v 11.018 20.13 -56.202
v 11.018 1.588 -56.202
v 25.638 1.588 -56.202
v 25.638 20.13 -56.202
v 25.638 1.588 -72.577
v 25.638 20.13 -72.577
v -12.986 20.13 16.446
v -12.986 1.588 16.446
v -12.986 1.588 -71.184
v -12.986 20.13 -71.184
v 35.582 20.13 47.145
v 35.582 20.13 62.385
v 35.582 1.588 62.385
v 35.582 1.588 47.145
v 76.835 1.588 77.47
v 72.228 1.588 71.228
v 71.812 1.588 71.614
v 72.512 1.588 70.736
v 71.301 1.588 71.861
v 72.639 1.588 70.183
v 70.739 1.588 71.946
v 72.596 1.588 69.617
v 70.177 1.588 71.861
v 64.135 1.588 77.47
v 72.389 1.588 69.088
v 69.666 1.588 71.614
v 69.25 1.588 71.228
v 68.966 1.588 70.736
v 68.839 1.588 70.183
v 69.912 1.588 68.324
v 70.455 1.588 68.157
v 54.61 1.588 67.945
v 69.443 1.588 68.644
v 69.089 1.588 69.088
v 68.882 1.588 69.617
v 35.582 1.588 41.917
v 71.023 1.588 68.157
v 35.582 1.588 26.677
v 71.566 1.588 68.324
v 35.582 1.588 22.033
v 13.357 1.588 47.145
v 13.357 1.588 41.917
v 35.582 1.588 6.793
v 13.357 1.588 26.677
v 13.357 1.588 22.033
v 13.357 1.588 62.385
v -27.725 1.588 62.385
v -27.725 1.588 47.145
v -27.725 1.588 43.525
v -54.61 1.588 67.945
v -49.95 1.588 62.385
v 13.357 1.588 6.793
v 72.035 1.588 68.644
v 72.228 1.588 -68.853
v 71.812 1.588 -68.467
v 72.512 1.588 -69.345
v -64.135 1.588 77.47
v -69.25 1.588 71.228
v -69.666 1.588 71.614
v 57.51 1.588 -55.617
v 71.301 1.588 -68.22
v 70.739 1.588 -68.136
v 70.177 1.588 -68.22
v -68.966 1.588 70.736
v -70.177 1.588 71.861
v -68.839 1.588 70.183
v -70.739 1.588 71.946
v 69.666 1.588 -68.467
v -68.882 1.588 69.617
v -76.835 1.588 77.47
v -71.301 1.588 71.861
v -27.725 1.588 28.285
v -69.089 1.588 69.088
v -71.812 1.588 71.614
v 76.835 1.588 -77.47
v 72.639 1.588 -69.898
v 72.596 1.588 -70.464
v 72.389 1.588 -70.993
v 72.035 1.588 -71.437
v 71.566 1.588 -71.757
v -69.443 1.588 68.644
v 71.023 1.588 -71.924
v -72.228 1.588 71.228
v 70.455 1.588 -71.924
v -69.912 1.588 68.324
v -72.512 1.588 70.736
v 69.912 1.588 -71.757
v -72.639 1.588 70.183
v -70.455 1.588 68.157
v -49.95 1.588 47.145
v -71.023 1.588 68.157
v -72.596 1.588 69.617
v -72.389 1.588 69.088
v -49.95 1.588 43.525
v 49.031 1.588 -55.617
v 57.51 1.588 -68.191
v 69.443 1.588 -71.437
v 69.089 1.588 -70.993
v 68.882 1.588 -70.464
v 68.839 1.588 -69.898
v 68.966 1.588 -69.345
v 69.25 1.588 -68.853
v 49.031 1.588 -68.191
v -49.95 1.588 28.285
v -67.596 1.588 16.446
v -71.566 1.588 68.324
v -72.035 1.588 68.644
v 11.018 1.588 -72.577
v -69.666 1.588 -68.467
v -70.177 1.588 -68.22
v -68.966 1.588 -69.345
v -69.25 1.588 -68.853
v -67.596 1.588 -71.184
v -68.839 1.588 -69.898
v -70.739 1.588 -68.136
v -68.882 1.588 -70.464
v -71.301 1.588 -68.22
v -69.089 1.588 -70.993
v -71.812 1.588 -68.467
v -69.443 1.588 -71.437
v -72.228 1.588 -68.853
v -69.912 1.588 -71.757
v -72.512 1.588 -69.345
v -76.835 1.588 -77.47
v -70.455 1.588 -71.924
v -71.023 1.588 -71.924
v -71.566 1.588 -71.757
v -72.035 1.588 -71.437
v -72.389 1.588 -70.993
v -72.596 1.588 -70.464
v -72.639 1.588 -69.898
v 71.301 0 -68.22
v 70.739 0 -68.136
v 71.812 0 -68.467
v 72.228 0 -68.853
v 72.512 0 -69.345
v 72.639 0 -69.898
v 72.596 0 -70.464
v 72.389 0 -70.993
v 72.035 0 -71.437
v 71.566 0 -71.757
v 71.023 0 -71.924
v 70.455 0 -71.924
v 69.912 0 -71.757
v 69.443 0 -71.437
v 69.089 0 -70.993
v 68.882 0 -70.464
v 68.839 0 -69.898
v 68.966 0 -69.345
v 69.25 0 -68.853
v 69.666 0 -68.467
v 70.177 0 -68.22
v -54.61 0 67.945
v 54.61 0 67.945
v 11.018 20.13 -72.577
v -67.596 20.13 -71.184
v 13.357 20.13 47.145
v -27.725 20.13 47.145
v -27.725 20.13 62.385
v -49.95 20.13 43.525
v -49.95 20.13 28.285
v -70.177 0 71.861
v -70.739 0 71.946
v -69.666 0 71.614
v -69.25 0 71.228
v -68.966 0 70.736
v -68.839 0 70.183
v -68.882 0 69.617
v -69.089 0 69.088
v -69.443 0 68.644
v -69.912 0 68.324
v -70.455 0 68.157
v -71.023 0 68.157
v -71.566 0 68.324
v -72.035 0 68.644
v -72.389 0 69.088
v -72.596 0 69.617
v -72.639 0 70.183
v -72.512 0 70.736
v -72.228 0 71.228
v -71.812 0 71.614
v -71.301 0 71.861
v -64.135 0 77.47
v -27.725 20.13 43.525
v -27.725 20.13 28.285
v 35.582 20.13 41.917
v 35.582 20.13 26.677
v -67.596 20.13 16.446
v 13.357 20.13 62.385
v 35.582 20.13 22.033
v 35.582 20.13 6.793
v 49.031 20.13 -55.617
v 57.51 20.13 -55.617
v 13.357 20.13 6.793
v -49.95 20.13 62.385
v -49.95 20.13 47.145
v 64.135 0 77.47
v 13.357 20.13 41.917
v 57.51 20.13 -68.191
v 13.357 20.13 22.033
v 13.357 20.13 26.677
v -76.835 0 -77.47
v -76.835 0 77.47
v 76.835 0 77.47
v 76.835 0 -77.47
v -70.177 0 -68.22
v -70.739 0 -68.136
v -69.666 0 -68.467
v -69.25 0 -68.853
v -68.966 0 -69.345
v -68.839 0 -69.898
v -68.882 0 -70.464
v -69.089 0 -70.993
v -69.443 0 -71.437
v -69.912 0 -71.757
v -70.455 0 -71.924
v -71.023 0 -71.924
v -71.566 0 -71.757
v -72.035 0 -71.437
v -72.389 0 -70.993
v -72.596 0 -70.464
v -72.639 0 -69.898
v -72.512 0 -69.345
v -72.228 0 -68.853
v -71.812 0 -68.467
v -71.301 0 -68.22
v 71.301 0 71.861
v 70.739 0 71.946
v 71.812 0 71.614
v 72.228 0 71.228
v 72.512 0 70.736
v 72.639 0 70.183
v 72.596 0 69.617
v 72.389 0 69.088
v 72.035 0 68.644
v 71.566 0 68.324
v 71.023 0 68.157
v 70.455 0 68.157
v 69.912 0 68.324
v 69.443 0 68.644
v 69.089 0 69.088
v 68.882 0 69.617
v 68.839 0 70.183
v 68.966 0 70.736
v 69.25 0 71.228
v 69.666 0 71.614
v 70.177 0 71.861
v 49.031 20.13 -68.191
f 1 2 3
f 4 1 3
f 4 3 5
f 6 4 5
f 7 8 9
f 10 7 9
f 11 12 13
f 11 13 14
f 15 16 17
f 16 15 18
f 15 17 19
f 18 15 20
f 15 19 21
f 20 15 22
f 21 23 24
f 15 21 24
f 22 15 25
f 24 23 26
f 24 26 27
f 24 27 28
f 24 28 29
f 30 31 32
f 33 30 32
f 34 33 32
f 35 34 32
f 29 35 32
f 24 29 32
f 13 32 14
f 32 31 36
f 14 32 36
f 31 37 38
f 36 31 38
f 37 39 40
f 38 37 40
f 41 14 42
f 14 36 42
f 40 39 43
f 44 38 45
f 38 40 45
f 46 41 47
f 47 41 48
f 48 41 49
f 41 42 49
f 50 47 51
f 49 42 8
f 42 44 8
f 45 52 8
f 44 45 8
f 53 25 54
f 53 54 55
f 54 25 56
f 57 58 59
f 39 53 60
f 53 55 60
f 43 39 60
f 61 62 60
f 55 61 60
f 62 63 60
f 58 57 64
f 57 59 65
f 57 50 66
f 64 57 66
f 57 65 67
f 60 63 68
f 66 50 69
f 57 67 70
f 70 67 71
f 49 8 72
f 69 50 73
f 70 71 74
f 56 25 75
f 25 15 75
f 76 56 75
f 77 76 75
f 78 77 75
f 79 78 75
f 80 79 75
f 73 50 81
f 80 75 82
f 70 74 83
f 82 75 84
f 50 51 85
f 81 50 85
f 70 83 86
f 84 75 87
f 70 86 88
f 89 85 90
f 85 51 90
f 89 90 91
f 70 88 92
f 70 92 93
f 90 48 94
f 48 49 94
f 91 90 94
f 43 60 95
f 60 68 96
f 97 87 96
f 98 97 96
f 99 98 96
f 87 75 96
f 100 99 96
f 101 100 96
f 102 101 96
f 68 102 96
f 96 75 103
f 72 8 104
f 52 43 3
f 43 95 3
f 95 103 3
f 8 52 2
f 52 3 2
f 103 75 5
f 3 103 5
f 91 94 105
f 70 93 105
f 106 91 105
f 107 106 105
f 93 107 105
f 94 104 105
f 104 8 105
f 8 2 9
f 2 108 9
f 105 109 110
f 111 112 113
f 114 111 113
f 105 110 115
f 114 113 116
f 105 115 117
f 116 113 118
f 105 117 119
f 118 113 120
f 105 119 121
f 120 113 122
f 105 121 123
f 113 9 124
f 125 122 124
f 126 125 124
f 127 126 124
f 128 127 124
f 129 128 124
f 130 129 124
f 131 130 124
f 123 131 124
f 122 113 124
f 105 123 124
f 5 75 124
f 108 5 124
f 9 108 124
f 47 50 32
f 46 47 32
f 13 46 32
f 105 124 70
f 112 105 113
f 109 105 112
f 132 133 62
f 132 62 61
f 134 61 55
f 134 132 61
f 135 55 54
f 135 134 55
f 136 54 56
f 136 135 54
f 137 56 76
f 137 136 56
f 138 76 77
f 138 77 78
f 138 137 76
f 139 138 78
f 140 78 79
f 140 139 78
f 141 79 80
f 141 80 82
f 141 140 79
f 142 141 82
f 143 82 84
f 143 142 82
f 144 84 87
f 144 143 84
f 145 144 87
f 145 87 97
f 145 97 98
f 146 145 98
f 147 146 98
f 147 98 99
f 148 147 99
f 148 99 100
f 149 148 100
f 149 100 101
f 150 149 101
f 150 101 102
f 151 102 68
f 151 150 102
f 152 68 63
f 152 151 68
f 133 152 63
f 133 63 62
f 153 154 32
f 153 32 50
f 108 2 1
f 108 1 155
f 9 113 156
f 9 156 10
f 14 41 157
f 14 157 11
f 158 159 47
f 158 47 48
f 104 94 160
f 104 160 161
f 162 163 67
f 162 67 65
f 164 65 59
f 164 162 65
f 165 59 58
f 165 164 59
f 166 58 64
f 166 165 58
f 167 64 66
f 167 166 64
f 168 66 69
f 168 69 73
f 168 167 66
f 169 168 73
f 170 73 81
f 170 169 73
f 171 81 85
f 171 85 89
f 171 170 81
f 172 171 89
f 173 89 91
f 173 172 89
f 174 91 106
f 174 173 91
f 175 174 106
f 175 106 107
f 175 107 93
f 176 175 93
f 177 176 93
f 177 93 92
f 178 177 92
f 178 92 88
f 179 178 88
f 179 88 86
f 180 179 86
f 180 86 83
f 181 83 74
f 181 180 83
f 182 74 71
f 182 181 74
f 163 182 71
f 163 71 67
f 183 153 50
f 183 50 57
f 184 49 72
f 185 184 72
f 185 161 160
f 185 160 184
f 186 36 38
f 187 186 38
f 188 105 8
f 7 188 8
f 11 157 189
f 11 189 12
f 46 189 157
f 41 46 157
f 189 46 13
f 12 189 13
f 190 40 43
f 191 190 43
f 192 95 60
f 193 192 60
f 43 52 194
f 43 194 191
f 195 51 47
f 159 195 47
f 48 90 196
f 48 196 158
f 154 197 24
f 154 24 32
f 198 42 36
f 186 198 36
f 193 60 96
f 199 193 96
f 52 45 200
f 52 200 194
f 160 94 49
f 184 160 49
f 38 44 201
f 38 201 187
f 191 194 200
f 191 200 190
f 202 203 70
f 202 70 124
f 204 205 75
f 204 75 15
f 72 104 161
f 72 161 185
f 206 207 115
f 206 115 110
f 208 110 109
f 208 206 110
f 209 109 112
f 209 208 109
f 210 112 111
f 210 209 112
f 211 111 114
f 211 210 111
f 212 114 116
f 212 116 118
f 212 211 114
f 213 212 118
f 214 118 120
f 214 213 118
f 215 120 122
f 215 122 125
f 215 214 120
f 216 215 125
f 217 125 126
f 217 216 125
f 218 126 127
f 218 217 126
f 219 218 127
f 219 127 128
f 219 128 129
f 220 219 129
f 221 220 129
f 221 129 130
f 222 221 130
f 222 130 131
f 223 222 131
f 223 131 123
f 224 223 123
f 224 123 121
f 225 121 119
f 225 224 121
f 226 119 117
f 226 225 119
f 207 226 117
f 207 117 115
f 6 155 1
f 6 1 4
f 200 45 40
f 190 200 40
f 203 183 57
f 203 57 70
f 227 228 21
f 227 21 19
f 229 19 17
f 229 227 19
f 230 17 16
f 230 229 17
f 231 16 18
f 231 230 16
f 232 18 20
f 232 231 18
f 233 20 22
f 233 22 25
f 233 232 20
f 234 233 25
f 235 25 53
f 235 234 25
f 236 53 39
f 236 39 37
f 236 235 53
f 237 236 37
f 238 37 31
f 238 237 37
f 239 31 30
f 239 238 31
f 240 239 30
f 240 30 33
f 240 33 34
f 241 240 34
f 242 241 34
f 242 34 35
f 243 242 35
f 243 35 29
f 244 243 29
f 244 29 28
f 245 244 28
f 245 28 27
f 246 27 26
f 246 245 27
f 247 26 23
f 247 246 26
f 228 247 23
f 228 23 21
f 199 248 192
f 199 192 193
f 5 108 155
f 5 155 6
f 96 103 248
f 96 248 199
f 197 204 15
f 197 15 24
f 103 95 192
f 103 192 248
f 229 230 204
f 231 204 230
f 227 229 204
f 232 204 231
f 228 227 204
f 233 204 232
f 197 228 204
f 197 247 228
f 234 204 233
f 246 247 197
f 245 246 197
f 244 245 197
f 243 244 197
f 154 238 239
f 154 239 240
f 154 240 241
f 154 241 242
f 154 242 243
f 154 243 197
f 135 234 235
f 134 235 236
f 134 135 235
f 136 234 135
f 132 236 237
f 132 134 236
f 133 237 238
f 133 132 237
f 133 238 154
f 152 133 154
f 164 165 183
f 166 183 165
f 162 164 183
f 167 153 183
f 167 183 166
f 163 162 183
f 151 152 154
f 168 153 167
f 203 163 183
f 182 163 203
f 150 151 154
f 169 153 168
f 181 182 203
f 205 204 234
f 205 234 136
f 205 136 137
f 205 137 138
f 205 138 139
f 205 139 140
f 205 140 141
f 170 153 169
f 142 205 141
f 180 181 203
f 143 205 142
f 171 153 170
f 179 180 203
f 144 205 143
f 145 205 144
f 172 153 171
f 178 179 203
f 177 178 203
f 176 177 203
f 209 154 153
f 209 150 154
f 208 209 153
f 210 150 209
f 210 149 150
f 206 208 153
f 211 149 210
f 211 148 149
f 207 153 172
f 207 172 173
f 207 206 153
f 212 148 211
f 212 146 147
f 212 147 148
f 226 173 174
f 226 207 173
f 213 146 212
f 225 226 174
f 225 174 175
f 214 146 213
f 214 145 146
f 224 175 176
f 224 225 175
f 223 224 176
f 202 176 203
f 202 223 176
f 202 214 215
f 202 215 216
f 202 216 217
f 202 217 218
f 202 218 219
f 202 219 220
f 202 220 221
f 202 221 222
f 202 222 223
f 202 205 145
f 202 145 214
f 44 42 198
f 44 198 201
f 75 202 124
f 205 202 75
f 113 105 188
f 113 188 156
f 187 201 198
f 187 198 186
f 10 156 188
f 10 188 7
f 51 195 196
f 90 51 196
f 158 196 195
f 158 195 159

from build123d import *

# Parameters (mm, degrees)
SKETCH1_R           = 1.905
BOSS_EXTRUDE1_DEPTH = 1.5875
SKETCH2_W           = 22.225
SKETCH2_H           = 15.24
SKETCH2_W_2         = 14.620181031
SKETCH2_H_2         = 16.374602754
SKETCH2_W_3         = 54.61
SKETCH2_H_3         = 87.63
SKETCH2_W_4         = 8.479704998
SKETCH2_H_4         = 12.573355687
BOSS_EXTRUDE2_DEPTH = 18.542


with BuildPart() as part:
    # Sketch1 → Boss-Extrude1 (new body)
    with BuildSketch(Plane(origin=(0, 0, 0), x_dir=(1, 0, 0), z_dir=(0, 1, 0))):
        Polygon((-76.835, 77.47), (76.835, 77.47), (76.835, -77.47), (64.135, -77.47), (54.61, -67.945), (-54.61, -67.945), (-64.135, -77.47), (-76.835, -77.47), align=None)
        with Locations(Location((-70.739, 70.0405, 0), (0, 0, 270))):
            Circle(SKETCH1_R, mode=Mode.SUBTRACT)
        with Locations(Location((-70.739, -70.0405, 0), (0, 0, 270))):
            Circle(SKETCH1_R, mode=Mode.SUBTRACT)
        with Locations(Location((70.739, -70.0405, 0), (0, 0, 270))):
            Circle(SKETCH1_R, mode=Mode.SUBTRACT)
        with Locations(Location((70.739, 70.0405, 0), (0, 0, 270))):
            Circle(SKETCH1_R, mode=Mode.SUBTRACT)
    extrude(amount=BOSS_EXTRUDE1_DEPTH)

    # Sketch2 → Boss-Extrude2 (add)
    with BuildSketch(Plane(origin=(0, 1.5875, 0), x_dir=(1, 0, 0), z_dir=(0, 1, 0))):
        with Locations((-38.837784726, -54.764880682)):
            Rectangle(SKETCH2_W, SKETCH2_H)
        with Locations((-38.837784726, -35.904847152)):
            Rectangle(SKETCH2_W, SKETCH2_H)
        with Locations((24.469923971, -54.764880682)):
            Rectangle(SKETCH2_W, SKETCH2_H)
        with Locations((24.469923971, -34.296627238)):
            Rectangle(SKETCH2_W, SKETCH2_H)
        with Locations((24.469923971, -14.413181036)):
            Rectangle(SKETCH2_W, SKETCH2_H)
        with Locations((18.328285521, 64.38959472)):
            Rectangle(SKETCH2_W_2, SKETCH2_H_2)
        with Locations((-40.291302772, 27.368792631)):
            Rectangle(SKETCH2_W_3, SKETCH2_H_3)
        with Locations((53.270518185, 61.904163944)):
            Rectangle(SKETCH2_W_4, SKETCH2_H_4)
    extrude(amount=BOSS_EXTRUDE2_DEPTH)


solid = part.part
